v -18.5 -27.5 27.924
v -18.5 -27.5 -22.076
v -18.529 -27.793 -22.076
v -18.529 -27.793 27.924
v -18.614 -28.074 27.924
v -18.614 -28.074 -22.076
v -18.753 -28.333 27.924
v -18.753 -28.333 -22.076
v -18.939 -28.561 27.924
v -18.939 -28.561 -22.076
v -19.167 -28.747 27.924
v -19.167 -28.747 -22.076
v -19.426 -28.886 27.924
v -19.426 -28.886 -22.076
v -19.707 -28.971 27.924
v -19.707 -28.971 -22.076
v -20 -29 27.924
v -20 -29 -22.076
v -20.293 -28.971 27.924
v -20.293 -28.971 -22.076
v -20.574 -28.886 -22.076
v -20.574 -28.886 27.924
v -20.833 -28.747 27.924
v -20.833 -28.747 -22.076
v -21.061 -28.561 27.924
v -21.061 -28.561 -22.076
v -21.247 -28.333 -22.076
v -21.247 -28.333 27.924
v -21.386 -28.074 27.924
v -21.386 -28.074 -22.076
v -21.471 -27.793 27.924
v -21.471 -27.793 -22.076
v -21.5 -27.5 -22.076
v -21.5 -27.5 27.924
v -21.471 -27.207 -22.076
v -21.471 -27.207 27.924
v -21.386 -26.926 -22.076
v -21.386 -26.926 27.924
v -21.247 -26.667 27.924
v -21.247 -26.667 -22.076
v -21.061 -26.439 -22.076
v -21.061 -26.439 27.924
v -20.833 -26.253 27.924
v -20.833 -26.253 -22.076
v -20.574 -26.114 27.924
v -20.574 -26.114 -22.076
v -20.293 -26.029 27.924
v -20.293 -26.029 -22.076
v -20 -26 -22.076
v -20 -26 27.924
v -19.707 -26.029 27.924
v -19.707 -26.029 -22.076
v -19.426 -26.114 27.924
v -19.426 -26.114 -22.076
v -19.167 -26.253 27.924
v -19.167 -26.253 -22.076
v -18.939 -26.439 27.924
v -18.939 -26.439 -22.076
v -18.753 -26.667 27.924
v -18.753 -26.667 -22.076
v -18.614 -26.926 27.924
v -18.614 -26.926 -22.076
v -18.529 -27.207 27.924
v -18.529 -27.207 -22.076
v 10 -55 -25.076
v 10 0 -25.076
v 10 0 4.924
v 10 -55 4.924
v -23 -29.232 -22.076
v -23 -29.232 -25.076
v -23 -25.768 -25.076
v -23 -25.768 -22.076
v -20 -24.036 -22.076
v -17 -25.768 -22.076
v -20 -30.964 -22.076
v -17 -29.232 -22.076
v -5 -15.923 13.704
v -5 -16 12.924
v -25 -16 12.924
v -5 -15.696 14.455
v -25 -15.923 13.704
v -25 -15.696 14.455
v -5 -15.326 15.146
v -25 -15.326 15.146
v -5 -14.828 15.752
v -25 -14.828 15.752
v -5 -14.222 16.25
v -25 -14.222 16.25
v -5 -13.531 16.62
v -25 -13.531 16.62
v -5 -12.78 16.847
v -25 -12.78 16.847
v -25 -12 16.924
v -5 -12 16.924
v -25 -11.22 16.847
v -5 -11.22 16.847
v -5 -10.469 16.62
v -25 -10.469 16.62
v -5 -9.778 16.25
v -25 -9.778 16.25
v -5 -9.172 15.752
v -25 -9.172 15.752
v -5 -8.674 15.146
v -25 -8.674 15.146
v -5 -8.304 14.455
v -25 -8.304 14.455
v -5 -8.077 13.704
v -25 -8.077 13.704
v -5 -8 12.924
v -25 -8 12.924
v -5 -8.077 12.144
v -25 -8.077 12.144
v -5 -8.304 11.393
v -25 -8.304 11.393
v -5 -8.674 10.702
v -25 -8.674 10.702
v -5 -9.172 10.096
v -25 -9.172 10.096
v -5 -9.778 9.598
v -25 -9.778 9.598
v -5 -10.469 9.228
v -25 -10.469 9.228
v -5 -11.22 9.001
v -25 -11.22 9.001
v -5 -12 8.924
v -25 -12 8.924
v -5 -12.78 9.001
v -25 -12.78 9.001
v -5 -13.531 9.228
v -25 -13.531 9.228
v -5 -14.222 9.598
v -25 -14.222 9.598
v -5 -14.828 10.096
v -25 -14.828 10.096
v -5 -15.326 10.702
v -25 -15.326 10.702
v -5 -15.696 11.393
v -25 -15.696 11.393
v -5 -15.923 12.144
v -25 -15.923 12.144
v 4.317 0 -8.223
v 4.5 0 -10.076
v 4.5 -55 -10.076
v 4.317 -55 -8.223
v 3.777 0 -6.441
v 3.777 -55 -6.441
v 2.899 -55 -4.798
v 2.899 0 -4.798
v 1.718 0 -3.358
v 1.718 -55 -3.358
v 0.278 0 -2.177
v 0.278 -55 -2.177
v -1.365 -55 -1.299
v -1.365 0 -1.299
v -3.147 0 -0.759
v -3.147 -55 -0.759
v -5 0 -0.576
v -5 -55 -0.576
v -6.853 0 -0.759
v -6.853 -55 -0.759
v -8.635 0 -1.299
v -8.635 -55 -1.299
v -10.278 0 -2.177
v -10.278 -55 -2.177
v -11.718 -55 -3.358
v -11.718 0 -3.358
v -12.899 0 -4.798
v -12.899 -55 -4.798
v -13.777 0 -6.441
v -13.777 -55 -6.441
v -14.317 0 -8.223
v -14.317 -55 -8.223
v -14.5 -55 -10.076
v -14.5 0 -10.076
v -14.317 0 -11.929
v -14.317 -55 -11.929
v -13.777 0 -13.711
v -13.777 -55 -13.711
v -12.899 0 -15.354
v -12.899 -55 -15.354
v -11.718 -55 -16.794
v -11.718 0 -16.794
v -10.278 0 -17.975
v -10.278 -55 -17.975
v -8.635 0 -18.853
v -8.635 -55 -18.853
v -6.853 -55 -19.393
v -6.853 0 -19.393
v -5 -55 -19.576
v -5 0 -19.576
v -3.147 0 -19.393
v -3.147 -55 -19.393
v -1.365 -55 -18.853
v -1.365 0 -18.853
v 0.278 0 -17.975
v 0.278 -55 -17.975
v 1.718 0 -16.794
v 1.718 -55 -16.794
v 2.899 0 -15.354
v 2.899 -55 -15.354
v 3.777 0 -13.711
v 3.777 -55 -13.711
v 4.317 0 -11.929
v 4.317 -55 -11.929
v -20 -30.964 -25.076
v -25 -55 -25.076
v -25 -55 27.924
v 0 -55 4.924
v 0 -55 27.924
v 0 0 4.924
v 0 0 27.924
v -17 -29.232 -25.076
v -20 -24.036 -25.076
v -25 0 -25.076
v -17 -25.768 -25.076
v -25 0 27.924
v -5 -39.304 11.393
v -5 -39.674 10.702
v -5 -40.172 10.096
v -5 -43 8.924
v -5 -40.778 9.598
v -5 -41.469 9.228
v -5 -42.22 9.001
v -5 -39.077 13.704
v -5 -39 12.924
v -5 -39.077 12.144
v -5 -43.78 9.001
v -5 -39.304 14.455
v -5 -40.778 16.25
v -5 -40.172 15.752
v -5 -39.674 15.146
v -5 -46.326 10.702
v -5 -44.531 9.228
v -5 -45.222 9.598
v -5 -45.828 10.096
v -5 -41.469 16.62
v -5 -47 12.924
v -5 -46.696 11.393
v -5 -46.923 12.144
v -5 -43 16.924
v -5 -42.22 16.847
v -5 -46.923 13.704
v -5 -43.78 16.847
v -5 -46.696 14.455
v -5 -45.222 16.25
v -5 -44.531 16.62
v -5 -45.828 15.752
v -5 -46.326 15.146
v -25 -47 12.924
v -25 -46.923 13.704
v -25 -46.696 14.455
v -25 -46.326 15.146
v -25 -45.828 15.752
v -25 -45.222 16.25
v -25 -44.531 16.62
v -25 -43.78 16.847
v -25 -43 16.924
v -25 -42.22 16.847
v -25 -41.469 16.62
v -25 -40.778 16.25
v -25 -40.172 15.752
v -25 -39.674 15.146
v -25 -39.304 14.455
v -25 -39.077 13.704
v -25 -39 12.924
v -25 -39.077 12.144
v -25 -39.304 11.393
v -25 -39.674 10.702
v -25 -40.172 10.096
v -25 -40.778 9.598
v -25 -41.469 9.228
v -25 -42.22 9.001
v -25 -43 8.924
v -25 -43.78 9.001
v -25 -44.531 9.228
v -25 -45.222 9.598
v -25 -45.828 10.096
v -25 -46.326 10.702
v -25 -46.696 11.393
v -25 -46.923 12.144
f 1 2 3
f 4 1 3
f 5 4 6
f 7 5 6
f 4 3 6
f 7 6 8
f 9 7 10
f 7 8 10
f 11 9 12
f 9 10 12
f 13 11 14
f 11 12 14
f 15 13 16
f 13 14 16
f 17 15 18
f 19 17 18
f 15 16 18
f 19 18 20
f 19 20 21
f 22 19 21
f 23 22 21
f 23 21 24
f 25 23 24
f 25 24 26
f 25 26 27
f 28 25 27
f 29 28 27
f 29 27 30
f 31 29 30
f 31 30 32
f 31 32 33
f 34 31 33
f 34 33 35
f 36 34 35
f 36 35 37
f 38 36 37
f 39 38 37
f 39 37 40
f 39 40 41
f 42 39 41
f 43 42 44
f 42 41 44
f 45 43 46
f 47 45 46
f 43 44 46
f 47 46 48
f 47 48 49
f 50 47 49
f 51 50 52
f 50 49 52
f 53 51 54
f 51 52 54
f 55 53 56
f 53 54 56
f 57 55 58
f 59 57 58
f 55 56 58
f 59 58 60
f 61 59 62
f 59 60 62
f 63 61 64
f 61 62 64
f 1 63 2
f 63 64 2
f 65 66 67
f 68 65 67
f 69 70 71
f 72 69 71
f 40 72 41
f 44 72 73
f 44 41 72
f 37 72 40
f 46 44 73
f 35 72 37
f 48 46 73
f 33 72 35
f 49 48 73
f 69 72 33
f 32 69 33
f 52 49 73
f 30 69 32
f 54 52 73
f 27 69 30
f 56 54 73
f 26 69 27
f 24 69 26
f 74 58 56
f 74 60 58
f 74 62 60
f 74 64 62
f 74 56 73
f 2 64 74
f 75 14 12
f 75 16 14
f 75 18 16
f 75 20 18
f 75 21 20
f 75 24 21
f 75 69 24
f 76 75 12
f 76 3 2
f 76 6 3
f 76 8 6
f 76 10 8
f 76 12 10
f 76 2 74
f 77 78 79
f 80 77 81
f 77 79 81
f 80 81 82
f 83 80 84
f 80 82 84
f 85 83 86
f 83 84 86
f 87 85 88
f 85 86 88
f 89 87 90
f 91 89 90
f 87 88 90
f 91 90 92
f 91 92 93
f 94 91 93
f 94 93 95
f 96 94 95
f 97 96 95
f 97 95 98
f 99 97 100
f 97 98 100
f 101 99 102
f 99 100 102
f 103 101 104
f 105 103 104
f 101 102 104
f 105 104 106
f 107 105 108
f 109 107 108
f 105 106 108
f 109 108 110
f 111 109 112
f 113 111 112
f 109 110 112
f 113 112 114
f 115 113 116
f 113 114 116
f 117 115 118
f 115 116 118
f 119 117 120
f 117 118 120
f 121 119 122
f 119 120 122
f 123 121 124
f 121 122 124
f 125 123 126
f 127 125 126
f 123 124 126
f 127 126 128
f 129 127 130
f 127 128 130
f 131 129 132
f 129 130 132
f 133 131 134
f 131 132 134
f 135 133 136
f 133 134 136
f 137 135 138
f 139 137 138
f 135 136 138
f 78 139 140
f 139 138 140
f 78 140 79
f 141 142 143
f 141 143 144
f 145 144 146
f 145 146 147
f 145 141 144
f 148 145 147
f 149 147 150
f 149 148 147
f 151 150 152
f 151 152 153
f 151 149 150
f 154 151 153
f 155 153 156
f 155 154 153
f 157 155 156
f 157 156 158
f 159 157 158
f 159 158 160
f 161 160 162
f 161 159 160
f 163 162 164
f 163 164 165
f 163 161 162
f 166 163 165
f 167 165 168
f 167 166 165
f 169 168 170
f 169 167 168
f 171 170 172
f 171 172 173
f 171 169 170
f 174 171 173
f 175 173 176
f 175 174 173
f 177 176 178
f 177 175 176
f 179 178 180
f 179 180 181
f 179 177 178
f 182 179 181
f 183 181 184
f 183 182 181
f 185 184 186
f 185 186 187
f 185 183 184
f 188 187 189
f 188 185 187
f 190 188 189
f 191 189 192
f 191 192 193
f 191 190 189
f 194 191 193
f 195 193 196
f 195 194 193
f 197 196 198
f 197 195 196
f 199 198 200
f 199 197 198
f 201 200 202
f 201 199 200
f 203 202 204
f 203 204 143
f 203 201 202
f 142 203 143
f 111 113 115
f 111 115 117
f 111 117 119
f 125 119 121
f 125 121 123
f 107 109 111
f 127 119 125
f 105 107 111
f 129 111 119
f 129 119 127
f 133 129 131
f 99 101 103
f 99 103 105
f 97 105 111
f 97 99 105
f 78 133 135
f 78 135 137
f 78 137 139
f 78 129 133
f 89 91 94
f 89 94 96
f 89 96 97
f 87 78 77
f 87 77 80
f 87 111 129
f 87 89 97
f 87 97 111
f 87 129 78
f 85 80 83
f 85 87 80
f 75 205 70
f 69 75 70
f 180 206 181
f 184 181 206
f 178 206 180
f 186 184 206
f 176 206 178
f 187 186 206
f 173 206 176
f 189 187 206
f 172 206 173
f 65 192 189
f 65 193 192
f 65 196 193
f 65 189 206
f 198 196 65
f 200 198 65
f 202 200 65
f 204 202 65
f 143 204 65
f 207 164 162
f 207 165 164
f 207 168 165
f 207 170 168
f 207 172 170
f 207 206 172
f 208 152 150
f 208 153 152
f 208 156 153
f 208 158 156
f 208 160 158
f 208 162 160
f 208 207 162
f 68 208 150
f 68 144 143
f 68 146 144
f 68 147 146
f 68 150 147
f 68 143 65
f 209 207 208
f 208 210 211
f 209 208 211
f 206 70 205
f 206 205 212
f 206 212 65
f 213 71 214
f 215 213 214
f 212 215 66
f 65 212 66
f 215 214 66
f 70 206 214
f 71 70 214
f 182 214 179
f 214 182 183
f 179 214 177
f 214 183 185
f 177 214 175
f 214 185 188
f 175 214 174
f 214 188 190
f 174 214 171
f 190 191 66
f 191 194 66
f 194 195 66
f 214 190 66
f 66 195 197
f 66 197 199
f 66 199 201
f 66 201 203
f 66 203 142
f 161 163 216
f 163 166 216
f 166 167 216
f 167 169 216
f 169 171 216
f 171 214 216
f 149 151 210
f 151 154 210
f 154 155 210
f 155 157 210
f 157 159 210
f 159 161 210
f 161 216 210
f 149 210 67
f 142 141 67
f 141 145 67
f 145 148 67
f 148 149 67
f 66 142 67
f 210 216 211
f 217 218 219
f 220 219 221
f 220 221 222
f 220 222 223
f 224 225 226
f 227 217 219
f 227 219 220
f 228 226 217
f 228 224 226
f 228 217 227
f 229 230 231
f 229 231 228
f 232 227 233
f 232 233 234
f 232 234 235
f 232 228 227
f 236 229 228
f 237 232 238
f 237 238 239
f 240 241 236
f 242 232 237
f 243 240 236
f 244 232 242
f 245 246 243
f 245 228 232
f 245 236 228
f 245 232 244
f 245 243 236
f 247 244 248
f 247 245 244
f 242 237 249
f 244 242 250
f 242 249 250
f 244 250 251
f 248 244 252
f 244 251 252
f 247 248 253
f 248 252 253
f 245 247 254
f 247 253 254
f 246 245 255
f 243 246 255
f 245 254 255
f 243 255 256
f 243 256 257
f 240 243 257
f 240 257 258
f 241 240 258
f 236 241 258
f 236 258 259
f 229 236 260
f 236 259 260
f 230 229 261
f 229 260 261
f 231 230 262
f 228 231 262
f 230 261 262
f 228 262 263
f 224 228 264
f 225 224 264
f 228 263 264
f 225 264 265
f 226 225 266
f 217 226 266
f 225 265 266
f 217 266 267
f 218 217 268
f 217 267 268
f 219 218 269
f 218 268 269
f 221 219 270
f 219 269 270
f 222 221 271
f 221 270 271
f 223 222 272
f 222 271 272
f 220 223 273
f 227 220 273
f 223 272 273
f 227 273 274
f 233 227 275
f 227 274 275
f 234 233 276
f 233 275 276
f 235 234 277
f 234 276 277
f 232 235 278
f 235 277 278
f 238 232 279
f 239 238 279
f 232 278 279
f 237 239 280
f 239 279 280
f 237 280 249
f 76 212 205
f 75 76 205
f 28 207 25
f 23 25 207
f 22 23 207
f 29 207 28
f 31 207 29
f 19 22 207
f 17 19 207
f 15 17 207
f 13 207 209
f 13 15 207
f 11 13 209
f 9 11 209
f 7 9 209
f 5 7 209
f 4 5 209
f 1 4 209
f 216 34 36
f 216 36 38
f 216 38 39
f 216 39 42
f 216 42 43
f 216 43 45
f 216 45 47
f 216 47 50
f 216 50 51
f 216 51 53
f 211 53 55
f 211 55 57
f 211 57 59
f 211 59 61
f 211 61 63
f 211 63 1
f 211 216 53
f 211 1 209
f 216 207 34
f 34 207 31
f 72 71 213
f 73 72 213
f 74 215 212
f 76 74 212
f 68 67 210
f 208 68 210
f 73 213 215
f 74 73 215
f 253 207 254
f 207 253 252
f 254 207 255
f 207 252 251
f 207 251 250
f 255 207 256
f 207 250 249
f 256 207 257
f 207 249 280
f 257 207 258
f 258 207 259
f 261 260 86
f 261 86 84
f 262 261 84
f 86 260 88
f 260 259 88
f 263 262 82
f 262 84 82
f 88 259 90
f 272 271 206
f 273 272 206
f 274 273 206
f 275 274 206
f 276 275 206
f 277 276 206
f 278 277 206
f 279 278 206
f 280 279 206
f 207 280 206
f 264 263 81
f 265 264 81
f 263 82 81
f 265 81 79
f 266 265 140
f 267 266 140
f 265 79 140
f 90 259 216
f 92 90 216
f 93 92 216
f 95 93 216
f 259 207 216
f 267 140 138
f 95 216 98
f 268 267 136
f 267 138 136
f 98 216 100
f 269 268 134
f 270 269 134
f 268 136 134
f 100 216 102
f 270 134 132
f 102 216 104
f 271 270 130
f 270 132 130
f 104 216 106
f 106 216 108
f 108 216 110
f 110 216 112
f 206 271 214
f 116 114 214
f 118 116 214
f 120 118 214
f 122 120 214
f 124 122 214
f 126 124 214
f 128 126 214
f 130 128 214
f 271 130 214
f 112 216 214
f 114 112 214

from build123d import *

# Parameters (mm, degrees)
F0_R     = 9.5
F0_W     = 25
F0_H     = 23
F1_DEPTH = 55
F2_R     = 4
F3_DEPTH = 20
F4_R     = 1.5
F5_DEPTH = 3
F6_DEPTH = 55


with BuildPart() as f1:
    # F0 (on Front) → F1 (new body)
    with BuildSketch(Plane.XZ):
        Polygon((0, 4.9239983139), (-25, 4.9239983139), (-25, -25.0760016861), (10, -25.0760016861), (10, 4.9239983139), align=None)
        with Locations((-5, -10.0760016861)):
            Circle(F0_R, mode=Mode.SUBTRACT)
        with Locations((-12.5, 16.4239983139)):
            Rectangle(F0_W, F0_H)
    extrude(amount=F1_DEPTH)

    # F2 (on face) → F3 (cut)
    with BuildSketch(Plane(origin=(-25, 0, 0), x_dir=(0, -1, 0), z_dir=(-1, 0, 0))):
        with Locations((12, 12.9239983139)):
            Circle(F2_R)
        with Locations((43, 12.9239983139)):
            Circle(F2_R)
    extrude(amount=-F3_DEPTH, mode=Mode.SUBTRACT)

    # F4 (on face) → F5 (cut)
    with BuildSketch(Plane(origin=(0, 0, -25.0760016861), x_dir=(1, 0, 0), z_dir=(0, 0, -1))):
        Polygon((-17, 29.2320508076), (-20, 30.9641016151), (-23, 29.2320508076), (-23, 25.7679491924), (-20, 24.0358983849), (-17, 25.7679491924), align=None)
        with Locations((-20, 27.5)):
            Circle(F4_R, mode=Mode.SUBTRACT)
    extrude(amount=-F5_DEPTH, mode=Mode.SUBTRACT)

    # F6 (cut): a face of the model
    f6_faces = [f1.faces().sort_by_distance(p)[0] for p in [
        (-20, -27.5, -25.0760016861),
    ]]
    extrude(f6_faces, amount=-F6_DEPTH, mode=Mode.SUBTRACT)


solid = f1.part
